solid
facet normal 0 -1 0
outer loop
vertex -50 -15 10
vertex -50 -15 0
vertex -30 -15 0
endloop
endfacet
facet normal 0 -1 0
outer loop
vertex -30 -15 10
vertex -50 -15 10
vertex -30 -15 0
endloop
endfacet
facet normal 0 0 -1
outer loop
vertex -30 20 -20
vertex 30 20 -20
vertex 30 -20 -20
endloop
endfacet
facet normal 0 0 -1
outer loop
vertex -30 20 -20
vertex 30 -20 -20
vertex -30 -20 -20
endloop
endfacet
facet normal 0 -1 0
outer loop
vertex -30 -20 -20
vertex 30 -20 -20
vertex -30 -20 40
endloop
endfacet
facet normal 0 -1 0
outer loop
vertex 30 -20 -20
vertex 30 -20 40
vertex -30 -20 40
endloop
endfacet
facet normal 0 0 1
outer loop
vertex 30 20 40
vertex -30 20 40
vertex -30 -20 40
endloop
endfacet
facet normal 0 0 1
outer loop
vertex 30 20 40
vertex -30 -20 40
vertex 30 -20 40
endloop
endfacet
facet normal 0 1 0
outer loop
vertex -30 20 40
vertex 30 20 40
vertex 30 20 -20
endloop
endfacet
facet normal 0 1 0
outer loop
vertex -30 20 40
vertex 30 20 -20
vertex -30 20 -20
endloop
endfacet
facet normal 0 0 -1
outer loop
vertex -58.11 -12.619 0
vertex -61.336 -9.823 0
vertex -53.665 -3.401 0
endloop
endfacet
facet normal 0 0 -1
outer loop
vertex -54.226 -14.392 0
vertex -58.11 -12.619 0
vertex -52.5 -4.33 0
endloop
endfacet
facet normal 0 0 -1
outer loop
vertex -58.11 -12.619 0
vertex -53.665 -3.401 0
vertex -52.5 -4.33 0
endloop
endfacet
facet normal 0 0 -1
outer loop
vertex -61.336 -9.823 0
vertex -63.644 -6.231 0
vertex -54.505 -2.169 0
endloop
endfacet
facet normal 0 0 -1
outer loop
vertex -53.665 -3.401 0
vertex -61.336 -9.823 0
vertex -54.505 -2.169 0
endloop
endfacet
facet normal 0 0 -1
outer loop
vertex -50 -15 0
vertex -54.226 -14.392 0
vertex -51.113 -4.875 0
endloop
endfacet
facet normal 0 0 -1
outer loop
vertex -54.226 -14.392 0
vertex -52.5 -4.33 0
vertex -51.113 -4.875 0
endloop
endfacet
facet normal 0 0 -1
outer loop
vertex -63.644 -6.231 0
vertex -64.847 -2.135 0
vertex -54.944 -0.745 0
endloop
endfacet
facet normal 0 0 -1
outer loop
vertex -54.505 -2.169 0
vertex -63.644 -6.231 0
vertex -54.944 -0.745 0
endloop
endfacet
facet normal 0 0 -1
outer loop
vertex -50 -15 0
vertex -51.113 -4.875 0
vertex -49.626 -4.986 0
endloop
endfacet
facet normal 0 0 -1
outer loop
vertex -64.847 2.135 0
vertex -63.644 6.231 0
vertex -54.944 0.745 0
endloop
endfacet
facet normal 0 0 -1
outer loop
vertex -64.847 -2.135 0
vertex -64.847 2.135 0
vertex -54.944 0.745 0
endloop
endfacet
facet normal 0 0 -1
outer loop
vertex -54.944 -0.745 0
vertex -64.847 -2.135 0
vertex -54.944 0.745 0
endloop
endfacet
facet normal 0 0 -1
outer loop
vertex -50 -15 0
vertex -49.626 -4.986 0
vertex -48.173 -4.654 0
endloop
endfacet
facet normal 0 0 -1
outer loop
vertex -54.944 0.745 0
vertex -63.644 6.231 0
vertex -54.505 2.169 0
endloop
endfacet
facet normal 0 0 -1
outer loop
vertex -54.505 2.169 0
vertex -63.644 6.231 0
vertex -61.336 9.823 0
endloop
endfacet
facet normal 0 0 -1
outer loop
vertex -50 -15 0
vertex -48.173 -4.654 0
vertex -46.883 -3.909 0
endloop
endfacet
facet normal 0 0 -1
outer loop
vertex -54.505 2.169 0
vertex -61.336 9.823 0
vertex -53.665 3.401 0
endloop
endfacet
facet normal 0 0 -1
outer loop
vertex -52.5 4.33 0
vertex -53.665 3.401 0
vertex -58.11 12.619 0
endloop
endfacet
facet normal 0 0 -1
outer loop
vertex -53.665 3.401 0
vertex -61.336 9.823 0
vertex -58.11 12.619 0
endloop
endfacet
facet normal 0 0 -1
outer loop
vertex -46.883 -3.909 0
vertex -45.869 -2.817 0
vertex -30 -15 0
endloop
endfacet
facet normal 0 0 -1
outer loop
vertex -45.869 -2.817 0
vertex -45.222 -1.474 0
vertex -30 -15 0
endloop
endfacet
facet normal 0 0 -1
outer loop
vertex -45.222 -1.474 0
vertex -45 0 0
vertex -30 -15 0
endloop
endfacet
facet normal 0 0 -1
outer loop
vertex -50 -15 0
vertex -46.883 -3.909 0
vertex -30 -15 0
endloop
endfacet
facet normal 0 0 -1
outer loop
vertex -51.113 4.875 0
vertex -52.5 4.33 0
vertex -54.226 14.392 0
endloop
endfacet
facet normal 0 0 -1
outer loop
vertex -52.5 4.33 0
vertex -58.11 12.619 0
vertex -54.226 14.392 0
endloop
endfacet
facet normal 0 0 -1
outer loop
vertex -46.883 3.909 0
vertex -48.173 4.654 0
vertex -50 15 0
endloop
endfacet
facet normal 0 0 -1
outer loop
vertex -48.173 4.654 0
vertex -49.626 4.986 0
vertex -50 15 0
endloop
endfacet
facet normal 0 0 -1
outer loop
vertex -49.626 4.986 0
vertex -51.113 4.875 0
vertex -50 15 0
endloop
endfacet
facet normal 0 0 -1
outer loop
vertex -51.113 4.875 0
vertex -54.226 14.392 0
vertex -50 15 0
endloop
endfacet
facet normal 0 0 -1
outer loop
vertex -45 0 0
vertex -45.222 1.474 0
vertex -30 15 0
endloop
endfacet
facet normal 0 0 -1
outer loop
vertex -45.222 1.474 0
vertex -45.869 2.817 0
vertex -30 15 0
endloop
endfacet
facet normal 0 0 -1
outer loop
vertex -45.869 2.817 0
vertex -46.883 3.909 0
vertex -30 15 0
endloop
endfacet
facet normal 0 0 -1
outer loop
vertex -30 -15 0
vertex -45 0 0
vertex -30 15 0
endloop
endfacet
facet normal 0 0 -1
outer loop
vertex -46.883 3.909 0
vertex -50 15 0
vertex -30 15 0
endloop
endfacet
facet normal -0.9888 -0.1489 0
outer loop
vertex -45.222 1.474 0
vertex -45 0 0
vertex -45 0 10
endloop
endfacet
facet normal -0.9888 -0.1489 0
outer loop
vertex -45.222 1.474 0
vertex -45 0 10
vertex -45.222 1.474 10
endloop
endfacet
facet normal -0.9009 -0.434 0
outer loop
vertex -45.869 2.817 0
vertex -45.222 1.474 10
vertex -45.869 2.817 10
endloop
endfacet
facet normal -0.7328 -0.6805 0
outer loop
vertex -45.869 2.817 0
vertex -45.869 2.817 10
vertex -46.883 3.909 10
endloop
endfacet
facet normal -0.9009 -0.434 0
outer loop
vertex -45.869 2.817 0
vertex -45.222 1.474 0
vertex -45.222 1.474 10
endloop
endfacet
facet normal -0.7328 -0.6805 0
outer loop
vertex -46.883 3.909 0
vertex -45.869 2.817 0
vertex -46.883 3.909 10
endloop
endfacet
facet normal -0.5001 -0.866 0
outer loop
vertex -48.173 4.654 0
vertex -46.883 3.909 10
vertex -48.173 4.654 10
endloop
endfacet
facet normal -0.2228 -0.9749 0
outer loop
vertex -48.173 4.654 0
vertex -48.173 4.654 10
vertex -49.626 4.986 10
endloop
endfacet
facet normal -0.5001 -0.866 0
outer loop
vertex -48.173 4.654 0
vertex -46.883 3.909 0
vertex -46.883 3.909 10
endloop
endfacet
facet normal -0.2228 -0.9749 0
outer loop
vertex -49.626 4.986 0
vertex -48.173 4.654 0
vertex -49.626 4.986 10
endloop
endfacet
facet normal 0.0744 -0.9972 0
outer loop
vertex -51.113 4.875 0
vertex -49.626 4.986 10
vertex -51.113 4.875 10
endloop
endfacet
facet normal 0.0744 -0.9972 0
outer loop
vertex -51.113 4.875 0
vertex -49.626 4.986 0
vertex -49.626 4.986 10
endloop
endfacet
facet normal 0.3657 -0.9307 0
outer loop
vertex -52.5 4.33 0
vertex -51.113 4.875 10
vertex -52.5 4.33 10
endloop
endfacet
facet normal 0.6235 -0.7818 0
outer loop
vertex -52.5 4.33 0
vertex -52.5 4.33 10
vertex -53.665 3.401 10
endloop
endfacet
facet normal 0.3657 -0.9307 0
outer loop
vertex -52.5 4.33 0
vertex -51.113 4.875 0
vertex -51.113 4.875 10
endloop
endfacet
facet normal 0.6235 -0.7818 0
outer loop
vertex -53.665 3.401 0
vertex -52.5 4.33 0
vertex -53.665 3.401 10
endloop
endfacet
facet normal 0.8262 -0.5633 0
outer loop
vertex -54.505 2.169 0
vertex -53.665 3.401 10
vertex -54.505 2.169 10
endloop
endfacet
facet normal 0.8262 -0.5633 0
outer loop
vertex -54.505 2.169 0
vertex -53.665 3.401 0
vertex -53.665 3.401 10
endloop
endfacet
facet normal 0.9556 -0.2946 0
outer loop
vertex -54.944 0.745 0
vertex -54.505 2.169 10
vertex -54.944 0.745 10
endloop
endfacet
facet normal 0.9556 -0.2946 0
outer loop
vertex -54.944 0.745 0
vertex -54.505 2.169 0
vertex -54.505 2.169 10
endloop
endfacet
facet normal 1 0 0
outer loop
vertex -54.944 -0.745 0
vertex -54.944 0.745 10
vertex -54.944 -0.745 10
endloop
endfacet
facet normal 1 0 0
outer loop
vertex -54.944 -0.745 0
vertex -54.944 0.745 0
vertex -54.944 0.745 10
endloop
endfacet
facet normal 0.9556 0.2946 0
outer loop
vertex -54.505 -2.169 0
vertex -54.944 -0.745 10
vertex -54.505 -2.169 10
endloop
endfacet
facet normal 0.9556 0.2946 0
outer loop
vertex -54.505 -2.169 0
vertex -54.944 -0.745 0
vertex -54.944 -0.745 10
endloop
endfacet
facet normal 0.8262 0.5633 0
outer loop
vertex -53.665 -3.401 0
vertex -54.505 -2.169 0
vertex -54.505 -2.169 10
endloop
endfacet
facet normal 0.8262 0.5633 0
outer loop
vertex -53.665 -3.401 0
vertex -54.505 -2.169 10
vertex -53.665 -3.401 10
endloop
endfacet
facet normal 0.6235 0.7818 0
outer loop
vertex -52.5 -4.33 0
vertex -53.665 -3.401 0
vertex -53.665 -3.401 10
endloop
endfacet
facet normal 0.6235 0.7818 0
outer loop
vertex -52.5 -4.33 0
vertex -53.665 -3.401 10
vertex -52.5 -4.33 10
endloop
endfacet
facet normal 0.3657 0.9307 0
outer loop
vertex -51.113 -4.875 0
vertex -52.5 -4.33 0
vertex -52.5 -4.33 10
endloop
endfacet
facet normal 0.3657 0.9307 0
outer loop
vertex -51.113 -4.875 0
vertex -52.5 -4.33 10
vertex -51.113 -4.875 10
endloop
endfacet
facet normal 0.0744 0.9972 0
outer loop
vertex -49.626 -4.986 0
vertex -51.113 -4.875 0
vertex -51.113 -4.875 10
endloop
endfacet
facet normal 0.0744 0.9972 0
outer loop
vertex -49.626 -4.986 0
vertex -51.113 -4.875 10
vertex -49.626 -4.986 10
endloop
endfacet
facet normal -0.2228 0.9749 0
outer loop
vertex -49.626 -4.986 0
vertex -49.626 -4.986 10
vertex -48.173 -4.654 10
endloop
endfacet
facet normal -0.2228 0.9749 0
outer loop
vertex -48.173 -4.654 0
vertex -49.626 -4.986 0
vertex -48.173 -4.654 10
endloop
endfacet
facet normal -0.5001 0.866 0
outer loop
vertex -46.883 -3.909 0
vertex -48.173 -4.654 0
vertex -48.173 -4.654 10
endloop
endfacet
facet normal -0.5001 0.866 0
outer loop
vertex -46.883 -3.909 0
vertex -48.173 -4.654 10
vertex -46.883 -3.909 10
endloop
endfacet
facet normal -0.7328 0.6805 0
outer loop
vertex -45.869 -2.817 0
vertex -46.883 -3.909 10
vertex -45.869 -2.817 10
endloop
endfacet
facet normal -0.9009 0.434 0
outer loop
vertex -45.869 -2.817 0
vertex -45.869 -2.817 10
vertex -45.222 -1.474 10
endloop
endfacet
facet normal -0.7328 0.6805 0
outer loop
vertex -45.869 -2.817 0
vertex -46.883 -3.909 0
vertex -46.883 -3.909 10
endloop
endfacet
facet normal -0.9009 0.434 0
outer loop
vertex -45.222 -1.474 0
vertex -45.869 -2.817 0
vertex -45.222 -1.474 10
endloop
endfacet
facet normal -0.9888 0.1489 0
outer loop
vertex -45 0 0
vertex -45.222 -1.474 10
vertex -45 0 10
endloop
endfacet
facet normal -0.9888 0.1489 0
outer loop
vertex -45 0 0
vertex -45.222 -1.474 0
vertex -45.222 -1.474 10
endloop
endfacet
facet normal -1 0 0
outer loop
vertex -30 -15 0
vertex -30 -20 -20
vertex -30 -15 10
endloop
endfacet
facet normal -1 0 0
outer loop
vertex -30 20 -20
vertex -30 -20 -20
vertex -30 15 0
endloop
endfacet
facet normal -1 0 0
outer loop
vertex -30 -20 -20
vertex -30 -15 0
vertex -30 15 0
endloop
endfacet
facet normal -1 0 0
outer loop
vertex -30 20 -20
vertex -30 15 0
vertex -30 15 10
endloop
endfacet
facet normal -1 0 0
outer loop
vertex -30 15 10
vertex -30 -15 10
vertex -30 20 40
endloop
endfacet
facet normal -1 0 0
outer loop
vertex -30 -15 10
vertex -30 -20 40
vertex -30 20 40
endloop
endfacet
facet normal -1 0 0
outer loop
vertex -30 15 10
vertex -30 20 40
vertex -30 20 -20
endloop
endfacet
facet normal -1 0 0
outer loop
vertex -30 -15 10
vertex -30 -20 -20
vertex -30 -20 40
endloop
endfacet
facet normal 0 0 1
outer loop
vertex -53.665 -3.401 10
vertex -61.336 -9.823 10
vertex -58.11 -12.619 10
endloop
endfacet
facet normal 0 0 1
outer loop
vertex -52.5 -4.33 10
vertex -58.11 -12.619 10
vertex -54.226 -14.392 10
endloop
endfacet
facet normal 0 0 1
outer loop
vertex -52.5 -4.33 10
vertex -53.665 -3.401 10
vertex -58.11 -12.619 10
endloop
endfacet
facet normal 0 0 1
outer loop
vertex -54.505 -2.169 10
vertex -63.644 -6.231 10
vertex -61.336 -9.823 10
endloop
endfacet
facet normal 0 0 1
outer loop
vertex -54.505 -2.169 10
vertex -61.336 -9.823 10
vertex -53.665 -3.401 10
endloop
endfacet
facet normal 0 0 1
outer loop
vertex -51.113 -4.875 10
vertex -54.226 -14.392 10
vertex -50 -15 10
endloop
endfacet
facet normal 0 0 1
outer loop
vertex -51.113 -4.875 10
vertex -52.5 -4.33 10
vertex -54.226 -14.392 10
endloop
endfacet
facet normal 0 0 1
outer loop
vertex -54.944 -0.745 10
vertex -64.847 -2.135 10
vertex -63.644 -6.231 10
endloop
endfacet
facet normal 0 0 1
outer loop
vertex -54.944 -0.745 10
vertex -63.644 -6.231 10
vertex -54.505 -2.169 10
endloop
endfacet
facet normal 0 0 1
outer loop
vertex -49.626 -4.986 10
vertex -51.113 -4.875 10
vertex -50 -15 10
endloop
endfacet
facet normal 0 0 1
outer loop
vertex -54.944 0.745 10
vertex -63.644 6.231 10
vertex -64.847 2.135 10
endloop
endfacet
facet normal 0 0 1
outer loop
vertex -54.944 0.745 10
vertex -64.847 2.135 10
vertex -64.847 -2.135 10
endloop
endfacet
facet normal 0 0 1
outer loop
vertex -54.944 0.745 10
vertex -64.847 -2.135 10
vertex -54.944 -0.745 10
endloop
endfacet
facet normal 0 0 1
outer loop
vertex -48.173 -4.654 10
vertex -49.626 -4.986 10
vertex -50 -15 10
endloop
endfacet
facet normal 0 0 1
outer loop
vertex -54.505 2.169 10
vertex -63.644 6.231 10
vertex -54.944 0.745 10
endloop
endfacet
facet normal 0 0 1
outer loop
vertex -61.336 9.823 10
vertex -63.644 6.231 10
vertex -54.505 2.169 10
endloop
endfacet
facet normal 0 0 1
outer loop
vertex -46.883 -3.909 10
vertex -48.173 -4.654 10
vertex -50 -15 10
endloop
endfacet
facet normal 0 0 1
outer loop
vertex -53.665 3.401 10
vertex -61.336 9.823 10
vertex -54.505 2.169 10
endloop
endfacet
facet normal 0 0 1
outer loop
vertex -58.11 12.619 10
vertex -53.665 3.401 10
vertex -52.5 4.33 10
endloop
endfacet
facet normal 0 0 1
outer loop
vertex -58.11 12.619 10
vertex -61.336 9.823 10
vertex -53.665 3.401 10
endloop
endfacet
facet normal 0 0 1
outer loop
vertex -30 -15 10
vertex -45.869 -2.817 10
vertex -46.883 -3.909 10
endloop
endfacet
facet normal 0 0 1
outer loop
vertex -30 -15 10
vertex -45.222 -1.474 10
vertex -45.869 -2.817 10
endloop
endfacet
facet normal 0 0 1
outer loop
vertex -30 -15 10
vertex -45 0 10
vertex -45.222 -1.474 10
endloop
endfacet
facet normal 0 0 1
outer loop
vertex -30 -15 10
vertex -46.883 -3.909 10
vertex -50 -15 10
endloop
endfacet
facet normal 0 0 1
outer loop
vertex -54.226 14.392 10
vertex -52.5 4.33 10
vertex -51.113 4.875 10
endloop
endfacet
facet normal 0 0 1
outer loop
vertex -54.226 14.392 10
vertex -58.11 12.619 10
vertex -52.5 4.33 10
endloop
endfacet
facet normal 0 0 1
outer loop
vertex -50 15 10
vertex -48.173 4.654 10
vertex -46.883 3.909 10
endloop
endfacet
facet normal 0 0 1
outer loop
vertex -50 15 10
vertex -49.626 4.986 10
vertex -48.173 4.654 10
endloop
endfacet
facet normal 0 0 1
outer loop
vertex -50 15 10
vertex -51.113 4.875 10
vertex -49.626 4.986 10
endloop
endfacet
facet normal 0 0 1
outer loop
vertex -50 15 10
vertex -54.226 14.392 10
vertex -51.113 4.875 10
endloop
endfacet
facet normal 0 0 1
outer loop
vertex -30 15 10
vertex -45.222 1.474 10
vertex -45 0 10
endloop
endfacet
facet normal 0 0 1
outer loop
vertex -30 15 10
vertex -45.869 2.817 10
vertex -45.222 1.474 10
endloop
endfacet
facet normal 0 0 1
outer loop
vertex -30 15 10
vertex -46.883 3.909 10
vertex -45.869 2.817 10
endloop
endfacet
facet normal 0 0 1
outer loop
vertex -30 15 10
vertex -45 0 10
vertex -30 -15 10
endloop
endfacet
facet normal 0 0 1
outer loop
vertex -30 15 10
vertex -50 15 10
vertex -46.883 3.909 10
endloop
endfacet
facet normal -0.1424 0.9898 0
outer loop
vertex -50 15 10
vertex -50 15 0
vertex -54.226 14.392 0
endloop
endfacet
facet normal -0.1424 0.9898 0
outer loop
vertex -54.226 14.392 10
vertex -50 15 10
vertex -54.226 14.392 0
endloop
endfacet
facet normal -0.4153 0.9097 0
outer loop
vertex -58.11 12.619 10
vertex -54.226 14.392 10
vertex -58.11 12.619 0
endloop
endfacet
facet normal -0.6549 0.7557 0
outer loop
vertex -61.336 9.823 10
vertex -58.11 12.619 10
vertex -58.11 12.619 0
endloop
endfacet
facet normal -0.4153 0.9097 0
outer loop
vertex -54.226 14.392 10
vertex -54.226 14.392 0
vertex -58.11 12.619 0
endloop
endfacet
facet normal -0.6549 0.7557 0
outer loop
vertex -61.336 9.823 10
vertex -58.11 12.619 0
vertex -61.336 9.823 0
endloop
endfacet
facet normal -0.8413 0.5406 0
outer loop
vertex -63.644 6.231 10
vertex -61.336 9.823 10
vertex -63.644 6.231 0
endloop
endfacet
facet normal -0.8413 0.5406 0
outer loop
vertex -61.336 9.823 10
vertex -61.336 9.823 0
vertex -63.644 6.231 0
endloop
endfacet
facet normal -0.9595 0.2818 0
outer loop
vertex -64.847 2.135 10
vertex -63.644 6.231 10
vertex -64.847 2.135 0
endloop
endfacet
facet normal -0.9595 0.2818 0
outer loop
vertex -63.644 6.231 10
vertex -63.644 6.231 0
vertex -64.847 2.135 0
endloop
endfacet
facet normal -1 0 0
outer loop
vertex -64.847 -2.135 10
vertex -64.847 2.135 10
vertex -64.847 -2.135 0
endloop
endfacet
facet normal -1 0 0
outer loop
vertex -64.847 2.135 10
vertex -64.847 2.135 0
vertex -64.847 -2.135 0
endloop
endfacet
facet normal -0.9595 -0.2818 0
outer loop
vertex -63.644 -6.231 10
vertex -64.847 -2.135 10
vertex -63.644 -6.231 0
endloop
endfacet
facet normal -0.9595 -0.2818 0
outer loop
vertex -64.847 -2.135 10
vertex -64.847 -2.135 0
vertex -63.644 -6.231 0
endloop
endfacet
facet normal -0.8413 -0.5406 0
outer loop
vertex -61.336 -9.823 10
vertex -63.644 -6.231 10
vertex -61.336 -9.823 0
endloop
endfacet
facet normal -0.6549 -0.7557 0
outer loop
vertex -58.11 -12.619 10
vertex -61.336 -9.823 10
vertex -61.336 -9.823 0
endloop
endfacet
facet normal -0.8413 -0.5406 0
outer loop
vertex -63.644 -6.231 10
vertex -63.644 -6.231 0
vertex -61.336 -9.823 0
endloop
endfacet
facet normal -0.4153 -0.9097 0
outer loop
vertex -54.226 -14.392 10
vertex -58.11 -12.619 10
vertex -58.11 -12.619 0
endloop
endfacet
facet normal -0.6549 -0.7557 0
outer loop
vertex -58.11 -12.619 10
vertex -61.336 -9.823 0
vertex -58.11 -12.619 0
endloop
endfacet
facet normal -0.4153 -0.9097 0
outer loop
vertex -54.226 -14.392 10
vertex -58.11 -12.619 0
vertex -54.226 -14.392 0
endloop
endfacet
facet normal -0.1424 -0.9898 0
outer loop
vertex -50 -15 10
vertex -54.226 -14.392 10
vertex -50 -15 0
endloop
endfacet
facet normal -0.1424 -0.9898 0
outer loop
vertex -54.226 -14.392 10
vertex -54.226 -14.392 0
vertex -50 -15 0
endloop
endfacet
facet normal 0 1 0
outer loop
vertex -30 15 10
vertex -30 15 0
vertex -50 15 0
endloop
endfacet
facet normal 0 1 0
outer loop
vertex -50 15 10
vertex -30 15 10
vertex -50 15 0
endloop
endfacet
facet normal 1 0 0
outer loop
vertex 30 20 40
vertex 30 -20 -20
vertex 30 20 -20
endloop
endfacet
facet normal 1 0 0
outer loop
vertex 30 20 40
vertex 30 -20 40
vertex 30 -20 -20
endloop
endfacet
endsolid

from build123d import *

# Parameters (mm, degrees)
SKETCH1_R           = 5
BOSS_EXTRUDE1_DEPTH = 10
SKETCH2_W           = 60
SKETCH2_H           = 40
BOSS_EXTRUDE2_DEPTH = 30
SKETCH3_W           = 60
SKETCH3_H           = 40
BOSS_EXTRUDE3_DEPTH = 20


with BuildPart() as part:
    # Sketch1 → Boss-Extrude1 (new body)
    with BuildSketch(Plane.XY):
        with BuildLine():
            Line((-30, -15), (-30, -20))
            Line((-30, -20), (30, -20))
            Line((30, -20), (30, 20))
            Line((30, 20), (-30, 20))
            Line((-30, 20), (-30, 15))
            Line((-30, 15), (-50, 15))
            ThreePointArc((-50, 15), (-65, 0), (-50, -15))
            Line((-50, -15), (-30, -15))
        make_face()
        with Locations((-50, 0)):
            Circle(SKETCH1_R, mode=Mode.SUBTRACT)
    extrude(amount=BOSS_EXTRUDE1_DEPTH)

    # Sketch2 → Boss-Extrude2 (add)
    with BuildSketch(Plane.XY.offset(10)):
        Rectangle(SKETCH2_W, SKETCH2_H)
    extrude(amount=BOSS_EXTRUDE2_DEPTH)

    # Sketch3 → Boss-Extrude3 (add)
    with BuildSketch(Plane(origin=(0, 0, 0), x_dir=(-1, 0, 0), z_dir=(0, 0, -1))):
        Rectangle(SKETCH3_W, SKETCH3_H)
    extrude(amount=BOSS_EXTRUDE3_DEPTH)


solid = part.part
